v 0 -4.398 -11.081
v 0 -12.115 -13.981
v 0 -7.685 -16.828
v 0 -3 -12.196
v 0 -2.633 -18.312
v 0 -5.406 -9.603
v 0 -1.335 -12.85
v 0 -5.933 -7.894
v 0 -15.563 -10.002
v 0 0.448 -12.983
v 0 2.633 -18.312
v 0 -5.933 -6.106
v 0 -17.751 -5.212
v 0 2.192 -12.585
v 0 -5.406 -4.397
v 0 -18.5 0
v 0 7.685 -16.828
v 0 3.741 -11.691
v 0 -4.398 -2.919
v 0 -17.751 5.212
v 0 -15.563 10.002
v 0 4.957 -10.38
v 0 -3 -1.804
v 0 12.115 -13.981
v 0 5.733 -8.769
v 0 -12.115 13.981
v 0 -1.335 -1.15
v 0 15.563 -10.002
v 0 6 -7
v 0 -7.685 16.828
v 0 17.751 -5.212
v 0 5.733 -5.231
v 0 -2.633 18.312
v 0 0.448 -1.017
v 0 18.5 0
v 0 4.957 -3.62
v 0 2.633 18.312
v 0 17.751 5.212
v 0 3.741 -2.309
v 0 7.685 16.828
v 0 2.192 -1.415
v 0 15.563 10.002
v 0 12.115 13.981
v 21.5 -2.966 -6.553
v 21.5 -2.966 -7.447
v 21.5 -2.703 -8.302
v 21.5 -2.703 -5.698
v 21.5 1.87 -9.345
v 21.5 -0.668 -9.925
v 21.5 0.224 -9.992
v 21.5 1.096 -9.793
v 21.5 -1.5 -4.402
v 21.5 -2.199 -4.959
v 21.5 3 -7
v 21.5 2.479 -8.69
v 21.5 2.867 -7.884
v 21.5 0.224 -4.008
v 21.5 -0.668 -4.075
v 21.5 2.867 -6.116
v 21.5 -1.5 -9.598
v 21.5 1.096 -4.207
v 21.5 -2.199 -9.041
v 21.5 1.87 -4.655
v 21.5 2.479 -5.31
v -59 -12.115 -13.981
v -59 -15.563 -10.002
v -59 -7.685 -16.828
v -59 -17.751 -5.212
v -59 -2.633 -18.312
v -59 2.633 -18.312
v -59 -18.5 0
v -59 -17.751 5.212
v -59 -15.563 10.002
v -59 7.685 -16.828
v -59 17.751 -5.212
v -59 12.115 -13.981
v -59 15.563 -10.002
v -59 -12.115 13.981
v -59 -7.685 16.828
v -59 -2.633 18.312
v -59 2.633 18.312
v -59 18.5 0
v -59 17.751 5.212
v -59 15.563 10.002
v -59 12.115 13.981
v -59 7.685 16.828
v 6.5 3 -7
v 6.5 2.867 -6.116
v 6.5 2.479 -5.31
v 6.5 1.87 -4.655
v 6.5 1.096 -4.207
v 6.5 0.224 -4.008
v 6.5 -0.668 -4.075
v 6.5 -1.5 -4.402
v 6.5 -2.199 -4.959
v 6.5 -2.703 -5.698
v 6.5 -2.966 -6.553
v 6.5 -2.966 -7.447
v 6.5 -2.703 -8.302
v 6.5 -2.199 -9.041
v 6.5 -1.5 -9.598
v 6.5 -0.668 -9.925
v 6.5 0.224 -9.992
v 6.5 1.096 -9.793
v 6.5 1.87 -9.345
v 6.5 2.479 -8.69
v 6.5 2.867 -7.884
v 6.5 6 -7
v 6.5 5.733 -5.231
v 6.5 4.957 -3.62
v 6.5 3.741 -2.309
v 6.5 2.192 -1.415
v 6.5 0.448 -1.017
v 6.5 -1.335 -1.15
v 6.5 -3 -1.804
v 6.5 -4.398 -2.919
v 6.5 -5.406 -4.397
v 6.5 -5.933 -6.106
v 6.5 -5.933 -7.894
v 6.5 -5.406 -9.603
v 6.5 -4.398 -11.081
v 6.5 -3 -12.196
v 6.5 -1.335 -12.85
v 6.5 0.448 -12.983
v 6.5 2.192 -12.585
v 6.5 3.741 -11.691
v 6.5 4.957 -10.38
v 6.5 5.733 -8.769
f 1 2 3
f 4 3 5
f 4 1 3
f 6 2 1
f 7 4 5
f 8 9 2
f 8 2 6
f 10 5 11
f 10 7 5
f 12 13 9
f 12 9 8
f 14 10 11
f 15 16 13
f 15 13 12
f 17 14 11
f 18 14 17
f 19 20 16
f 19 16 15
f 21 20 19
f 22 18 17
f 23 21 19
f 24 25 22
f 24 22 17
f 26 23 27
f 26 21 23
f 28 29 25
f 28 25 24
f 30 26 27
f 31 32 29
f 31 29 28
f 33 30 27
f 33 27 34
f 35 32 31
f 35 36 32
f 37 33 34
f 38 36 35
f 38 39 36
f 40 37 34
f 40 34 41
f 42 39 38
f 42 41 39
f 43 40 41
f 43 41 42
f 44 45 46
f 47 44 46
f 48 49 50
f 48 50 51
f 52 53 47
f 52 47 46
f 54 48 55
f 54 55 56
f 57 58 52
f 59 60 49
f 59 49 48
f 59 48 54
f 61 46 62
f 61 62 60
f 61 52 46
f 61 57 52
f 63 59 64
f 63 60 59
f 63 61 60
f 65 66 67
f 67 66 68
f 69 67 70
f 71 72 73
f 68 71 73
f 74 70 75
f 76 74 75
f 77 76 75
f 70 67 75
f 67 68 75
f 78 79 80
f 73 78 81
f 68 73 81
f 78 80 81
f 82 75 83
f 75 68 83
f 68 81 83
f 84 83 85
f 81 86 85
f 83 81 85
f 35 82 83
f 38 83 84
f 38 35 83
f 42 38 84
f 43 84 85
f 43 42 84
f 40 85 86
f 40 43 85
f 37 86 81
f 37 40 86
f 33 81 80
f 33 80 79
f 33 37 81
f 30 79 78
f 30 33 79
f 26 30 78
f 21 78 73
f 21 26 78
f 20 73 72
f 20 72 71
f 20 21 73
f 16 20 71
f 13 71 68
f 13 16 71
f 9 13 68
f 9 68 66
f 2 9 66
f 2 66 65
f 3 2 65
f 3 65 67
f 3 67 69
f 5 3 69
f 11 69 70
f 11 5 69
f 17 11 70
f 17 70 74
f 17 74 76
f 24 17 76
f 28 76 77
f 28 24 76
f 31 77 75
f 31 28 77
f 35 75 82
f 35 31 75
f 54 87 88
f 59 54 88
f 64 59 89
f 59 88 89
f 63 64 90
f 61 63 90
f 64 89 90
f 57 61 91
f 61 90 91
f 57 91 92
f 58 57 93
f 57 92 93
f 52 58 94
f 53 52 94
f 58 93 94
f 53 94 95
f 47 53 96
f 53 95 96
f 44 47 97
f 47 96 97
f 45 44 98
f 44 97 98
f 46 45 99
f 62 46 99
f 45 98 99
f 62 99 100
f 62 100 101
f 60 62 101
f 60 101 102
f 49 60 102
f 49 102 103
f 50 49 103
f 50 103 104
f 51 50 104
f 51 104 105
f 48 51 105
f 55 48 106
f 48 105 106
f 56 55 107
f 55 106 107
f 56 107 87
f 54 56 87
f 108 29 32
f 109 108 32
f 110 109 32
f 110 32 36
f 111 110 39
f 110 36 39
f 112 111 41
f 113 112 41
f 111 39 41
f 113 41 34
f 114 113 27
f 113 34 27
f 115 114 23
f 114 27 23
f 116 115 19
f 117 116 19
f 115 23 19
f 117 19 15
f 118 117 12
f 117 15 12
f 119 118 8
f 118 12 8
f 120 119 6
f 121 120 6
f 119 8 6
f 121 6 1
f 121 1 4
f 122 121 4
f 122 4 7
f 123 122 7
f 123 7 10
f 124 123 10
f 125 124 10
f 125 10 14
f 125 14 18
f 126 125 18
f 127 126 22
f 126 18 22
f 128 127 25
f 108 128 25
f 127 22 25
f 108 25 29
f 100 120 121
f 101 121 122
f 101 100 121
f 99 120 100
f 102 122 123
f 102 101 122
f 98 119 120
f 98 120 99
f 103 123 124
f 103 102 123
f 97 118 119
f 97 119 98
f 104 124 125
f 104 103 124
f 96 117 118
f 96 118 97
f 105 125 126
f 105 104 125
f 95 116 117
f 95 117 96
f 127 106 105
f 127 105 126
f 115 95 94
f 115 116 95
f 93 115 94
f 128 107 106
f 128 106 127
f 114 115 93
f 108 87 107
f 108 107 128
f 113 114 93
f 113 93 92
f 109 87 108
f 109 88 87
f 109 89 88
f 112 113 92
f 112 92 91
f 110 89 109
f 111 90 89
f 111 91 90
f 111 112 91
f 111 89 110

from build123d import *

# Parameters (mm, degrees)
F0_R     = 18.5
F1_DEPTH = 59
F2_R     = 6
F3_DEPTH = 6.5
F4_R     = 3
F5_DEPTH = 15


with BuildPart() as f1:
    # F0 (on Right) → F1 (new body)
    with BuildSketch(Plane.YZ):
        Circle(F0_R)
    extrude(amount=-F1_DEPTH)

    # F2 (on face) → F3 (join)
    with BuildSketch(Plane.YZ):
        with Locations((0, -7)):
            Circle(F2_R)
    extrude(amount=F3_DEPTH)

    # F4 (on face) → F5 (join)
    with BuildSketch(Plane.YZ.offset(6.5)):
        with Locations((0, -7)):
            Circle(F4_R)
    extrude(amount=F5_DEPTH)


solid = f1.part
